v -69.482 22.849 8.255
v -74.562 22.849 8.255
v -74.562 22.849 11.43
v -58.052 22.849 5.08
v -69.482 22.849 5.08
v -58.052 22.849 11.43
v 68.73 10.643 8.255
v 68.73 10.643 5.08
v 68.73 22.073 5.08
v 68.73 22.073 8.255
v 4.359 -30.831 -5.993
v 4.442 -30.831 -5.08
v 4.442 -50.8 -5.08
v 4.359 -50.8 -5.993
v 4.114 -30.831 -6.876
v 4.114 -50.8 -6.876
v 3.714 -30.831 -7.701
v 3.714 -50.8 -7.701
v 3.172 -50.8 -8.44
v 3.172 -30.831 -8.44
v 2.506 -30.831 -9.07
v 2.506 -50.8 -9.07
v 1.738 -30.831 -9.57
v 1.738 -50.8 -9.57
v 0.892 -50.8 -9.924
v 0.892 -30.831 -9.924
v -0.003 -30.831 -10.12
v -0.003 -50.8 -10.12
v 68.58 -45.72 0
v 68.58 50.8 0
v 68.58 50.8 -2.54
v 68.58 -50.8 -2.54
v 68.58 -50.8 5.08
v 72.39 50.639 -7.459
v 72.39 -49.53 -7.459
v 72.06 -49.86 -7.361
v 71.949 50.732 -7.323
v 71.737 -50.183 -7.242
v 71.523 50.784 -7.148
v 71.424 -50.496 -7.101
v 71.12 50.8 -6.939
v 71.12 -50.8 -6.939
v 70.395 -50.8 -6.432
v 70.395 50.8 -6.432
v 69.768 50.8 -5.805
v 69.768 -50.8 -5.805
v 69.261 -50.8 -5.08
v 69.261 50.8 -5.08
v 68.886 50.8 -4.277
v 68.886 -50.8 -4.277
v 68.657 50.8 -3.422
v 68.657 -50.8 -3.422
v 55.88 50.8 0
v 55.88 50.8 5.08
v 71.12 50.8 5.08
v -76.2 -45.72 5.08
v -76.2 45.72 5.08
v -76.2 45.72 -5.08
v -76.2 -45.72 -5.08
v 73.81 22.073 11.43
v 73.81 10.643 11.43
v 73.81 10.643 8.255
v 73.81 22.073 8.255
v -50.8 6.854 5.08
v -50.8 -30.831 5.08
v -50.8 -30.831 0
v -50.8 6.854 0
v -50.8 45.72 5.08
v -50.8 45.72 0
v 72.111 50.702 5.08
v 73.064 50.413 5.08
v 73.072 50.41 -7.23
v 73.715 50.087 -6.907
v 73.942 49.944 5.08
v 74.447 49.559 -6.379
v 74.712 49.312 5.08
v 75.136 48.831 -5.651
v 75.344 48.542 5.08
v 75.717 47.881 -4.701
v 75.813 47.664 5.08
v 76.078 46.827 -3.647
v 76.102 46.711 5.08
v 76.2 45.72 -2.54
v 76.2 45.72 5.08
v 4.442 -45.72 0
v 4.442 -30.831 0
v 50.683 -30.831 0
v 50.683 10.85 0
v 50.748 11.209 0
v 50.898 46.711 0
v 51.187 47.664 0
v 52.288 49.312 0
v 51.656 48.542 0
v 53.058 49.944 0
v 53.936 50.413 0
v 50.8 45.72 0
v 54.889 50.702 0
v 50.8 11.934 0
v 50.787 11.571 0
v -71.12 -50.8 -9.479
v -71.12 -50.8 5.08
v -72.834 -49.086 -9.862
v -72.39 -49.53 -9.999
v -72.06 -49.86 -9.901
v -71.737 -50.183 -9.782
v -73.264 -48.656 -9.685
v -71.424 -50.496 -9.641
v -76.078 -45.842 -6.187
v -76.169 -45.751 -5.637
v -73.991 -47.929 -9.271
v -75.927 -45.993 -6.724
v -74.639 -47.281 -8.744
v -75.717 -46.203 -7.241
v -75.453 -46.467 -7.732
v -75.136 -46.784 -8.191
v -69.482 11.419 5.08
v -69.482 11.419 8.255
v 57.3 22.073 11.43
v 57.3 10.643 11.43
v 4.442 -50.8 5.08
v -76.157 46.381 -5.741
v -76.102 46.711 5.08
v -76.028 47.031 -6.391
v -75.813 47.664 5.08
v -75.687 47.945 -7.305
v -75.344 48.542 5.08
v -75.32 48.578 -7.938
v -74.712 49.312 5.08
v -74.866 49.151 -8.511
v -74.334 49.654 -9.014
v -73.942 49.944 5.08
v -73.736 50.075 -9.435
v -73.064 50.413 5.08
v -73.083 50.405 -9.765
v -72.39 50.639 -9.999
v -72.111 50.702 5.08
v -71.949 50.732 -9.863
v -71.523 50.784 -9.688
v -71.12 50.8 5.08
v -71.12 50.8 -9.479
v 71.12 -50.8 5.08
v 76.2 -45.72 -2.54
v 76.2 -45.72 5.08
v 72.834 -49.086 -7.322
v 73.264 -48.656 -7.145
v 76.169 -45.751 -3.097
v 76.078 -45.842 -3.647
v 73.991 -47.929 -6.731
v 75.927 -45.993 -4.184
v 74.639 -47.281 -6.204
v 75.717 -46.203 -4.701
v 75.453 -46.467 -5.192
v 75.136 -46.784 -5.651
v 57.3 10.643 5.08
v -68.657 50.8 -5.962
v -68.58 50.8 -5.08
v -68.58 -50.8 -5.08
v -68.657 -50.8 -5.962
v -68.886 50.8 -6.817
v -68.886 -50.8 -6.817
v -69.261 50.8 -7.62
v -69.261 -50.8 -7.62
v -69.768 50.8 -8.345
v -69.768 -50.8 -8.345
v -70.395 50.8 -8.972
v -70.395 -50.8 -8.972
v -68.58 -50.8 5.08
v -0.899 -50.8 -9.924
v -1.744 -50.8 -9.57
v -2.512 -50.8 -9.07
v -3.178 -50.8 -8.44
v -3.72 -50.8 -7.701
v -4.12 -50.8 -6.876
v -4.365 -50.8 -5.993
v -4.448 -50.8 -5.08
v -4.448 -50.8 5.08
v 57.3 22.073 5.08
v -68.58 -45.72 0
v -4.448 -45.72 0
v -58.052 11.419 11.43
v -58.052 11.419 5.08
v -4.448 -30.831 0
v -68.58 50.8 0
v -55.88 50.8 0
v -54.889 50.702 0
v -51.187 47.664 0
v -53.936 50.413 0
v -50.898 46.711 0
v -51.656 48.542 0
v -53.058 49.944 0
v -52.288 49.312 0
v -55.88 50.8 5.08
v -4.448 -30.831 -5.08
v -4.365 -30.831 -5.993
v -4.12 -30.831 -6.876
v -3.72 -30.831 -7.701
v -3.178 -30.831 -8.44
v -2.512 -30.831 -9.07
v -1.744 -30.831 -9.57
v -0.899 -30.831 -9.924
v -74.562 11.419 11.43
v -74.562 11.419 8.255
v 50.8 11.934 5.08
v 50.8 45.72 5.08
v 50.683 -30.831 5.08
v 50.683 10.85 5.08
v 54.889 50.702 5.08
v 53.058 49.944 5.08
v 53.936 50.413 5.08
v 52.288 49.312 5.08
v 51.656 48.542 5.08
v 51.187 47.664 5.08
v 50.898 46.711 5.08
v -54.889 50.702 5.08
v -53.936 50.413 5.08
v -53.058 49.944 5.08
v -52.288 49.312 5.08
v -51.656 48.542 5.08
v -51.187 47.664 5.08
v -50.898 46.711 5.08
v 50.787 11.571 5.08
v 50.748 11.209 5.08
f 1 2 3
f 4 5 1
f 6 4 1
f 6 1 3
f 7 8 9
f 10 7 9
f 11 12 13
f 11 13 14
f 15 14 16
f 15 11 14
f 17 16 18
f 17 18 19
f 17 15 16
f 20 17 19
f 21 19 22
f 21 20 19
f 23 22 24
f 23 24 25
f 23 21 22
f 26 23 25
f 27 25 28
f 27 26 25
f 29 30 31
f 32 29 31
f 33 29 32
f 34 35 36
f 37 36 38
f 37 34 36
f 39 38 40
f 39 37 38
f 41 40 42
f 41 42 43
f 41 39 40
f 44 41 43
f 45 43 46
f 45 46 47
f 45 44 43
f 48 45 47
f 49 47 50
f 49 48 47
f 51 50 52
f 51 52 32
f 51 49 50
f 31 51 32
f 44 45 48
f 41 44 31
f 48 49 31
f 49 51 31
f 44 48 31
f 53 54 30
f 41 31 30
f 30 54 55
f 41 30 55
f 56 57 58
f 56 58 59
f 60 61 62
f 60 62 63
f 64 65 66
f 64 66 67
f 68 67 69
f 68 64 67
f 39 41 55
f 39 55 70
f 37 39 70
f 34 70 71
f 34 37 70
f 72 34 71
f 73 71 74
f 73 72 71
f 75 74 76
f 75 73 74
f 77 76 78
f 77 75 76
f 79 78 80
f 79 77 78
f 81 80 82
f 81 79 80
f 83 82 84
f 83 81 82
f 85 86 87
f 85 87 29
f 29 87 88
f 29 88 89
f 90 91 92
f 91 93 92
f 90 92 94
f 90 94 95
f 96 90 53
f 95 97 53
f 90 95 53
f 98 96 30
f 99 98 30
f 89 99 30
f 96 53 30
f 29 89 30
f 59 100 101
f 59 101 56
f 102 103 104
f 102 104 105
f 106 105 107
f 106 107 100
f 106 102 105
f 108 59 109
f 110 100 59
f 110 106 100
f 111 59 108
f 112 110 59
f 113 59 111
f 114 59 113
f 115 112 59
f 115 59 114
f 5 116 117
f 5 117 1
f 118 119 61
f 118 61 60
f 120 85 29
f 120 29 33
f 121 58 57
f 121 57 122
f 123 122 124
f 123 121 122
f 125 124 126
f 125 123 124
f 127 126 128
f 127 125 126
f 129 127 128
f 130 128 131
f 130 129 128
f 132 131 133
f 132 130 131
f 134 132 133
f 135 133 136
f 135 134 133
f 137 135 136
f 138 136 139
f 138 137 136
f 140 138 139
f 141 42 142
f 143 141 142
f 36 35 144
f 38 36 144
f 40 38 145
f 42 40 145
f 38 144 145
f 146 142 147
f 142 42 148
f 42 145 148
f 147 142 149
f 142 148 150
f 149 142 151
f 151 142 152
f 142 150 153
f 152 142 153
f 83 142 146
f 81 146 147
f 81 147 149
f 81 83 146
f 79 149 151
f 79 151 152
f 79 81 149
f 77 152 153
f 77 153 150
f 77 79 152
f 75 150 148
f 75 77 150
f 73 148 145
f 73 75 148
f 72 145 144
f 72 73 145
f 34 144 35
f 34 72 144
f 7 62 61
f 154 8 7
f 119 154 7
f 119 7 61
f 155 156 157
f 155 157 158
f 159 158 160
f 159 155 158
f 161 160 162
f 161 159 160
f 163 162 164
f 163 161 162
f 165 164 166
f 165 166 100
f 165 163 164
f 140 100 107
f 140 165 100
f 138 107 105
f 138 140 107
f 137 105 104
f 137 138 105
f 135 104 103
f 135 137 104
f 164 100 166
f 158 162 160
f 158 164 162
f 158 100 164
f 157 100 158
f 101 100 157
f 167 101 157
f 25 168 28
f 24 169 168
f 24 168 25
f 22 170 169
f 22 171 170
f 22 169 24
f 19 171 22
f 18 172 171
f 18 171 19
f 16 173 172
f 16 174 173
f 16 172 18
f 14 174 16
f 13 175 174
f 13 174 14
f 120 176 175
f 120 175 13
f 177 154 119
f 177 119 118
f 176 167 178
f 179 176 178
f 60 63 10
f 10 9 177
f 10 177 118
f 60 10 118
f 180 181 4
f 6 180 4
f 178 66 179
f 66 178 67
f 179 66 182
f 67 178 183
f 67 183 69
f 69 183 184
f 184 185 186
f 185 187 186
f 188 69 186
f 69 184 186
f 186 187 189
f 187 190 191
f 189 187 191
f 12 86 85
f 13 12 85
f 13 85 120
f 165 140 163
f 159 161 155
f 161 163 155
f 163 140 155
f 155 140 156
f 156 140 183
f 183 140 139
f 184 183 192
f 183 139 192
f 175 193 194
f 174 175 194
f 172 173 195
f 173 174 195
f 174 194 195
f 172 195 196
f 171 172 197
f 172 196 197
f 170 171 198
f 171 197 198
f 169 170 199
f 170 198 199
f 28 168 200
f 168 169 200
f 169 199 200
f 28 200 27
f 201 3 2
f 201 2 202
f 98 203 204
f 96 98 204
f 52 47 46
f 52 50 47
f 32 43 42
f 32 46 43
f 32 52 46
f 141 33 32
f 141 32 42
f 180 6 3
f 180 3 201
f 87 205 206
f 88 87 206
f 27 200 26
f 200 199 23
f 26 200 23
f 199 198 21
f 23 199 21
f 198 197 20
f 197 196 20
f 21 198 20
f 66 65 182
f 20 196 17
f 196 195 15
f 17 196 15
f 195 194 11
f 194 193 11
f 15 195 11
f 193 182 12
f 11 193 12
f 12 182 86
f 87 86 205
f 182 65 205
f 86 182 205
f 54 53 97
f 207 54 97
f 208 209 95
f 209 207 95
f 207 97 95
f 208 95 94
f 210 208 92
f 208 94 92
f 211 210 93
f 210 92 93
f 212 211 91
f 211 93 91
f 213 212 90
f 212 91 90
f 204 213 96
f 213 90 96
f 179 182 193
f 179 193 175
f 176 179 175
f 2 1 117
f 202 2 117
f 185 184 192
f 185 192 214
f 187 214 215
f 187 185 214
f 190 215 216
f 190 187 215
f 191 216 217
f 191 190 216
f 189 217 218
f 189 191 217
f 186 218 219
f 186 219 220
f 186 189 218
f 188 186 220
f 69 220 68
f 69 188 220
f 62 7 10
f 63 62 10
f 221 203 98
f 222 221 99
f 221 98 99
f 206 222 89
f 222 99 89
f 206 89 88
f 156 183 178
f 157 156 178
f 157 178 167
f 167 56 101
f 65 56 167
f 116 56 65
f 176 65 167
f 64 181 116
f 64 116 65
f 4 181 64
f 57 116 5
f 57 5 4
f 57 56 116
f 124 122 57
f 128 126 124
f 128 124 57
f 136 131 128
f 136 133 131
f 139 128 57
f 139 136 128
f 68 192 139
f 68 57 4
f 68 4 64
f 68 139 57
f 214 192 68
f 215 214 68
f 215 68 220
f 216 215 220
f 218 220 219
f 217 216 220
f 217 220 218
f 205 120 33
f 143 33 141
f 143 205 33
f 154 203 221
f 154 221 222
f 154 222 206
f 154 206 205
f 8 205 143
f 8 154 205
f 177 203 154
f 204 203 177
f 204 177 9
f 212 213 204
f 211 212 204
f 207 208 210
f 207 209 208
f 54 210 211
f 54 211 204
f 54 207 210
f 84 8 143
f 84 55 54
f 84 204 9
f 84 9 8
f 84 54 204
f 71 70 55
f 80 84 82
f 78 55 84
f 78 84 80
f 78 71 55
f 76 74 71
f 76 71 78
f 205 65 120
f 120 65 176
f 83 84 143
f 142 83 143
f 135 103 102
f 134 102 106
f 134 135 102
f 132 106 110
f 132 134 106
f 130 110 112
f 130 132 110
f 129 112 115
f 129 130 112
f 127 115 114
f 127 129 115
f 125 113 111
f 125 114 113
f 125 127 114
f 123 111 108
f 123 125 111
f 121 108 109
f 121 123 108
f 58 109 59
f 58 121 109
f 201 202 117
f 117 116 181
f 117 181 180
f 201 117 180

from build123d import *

# Parameters (mm, degrees)
F0_W          = 152.4
F0_H          = 101.6
F1_DEPTH      = 5.08
F2_W          = 7.62
F2_H          = 101.6
F3_DEPTH      = 10.16
F4_T1_DEPTH   = 127
F5_W          = 7.62
F5_H          = 101.6
F6_DEPTH      = 7.62
F7_T1_DEPTH   = 127
F8_W          = 8.89
F8_H          = 101.6
F9_DEPTH      = 10.16
F10_T1_DEPTH  = 127
F11_W         = 101.6
F11_H         = 43.9456890713
F12_DEPTH     = 25.4
F13_T1_DEPTH  = 5.08
F13_T3_DEPTH  = 30.48
F13_T5_DEPTH  = 35.56
F13_T7_DEPTH  = 33.02
F14_T1_DEPTH  = 36.2882991577
F14_T3_DEPTH  = 33.7482991577
F14_T5_DEPTH  = 64.1381350342
F14_T7_DEPTH  = 64.1318649658
F14_T12_DEPTH = 90.2664341919
F14_T17_DEPTH = 90.2601641236
F15_W         = 11.43
F15_H         = 11.43
F16_DEPTH     = 6.35
F17_W         = 11.43
F17_H         = 11.43
F18_DEPTH     = 6.35
F19_W         = 11.43
F19_H         = 3.175
F20_DEPTH     = 5.08
F21_W         = 11.43
F21_H         = 3.175
F22_DEPTH     = 5.08
F23_W         = 101.4830252707
F23_H         = 42.7652306713
F24_DEPTH     = 25.4


# Not quite as in the source:
# - a fillet or chamfer that OpenCascade refuses, or shapes differently, is made with other operations: its cross-section is extruded or revolved along the edge and cut away or added


with BuildPart() as f1:
    # F0 (on Top) → F1 (new body)
    with BuildSketch(Plane.XY):
        Rectangle(F0_W, F0_H)
    extrude(amount=F1_DEPTH)

    # F2 (on face) → F3 (join)
    with BuildSketch(Plane(origin=(0, 0, 0), x_dir=(1, 0, 0), z_dir=(0, 0, -1))):
        with Locations((-72.39, 0)):
            Rectangle(F2_W, F2_H)
    extrude(amount=F3_DEPTH)

    # F4: fillet of radius 5.08 on 2 edges, made by hand

    # F4_s2 → F4_t1 (cut)
    with BuildSketch(Plane.XZ.offset(-63.5)):
        with BuildLine():
            ThreePointArc((-71.12, -10.16), (-74.7121024484, -8.6721024484), (-76.2, -5.08))
            Line((-76.2, -5.08), (-76.2, -10.16))
            Line((-76.2, -10.16), (-71.12, -10.16))
        make_face()
        with BuildLine():
            ThreePointArc((-68.58, -5.08), (-70.0678975516, -8.6721024484), (-73.66, -10.16))
            Line((-73.66, -10.16), (-68.58, -10.16))
            Line((-68.58, -10.16), (-68.58, -5.08))
        make_face()
    extrude(amount=F4_T1_DEPTH, mode=Mode.SUBTRACT)

    # F5 (on face) → F6 (join)
    with BuildSketch(Plane(origin=(0, 0, 0), x_dir=(1, 0, 0), z_dir=(0, 0, -1))):
        with Locations((72.39, 0)):
            Rectangle(F5_W, F5_H)
    extrude(amount=F6_DEPTH)

    # F7: fillet of radius 5.08 on 2 edges, made by hand

    # F7_s2 → F7_t1 (cut)
    with BuildSketch(Plane.XZ.offset(-63.5)):
        with BuildLine():
            ThreePointArc((76.2, -2.54), (74.7121024484, -6.1321024484), (71.12, -7.62))
            Line((71.12, -7.62), (76.2, -7.62))
            Line((76.2, -7.62), (76.2, -2.54))
        make_face()
        with BuildLine():
            ThreePointArc((73.66, -7.62), (70.0678975516, -6.1321024484), (68.58, -2.54))
            Line((68.58, -2.54), (68.58, -7.62))
            Line((68.58, -7.62), (73.66, -7.62))
        make_face()
    extrude(amount=F7_T1_DEPTH, mode=Mode.SUBTRACT)

    # F8 (on face) → F9 (join)
    with BuildSketch(Plane(origin=(0, 0, 0), x_dir=(1, 0, 0), z_dir=(0, 0, -1))):
        with Locations((-0.0031350342, 0)):
            Rectangle(F8_W, F8_H)
    extrude(amount=F9_DEPTH)

    # F10: fillet of radius 5.08 on 2 edges, made by hand

    # F10_s2 → F10_t1 (cut)
    with BuildSketch(Plane.XZ.offset(-63.5)):
        with BuildLine():
            ThreePointArc((-4.4481350342, -5.08), (-2.9602374826, -8.6721024484), (0.6318649658, -10.16))
            Line((0.6318649658, -10.16), (-4.4481350342, -10.16))
            Line((-4.4481350342, -10.16), (-4.4481350342, -5.08))
        make_face()
        with BuildLine():
            ThreePointArc((4.4418649658, -5.08), (2.9539674142, -8.6721024484), (-0.6381350342, -10.16))
            Line((-0.6381350342, -10.16), (4.4418649658, -10.16))
            Line((4.4418649658, -10.16), (4.4418649658, -5.08))
        make_face()
    extrude(amount=F10_T1_DEPTH, mode=Mode.SUBTRACT)

    # F11 (on face) → F12 (cut)
    with BuildSketch(Plane.XY.offset(5.08)):
        with Locations((0, 28.8271554643)):
            Rectangle(F11_W, F11_H)
    extrude(amount=-F12_DEPTH, mode=Mode.SUBTRACT)

    # F13: fillet of radius 5.08 on 5 edges, made by hand

    # F13_s2 → F13_t1 (join)
    with BuildSketch(Plane.XY):
        with BuildLine():
            ThreePointArc((50.8, 11.9343109287), (49.3121024484, 8.3422084803), (45.72, 6.8543109287))
            Line((45.72, 6.8543109287), (50.8, 6.8543109287))
            Line((50.8, 6.8543109287), (50.8, 11.9343109287))
        make_face()
    extrude(amount=F13_T1_DEPTH)

    # F13_s4 → F13_t3 (cut)
    with BuildSketch(Plane.XY.offset(-12.7)):
        with BuildLine():
            ThreePointArc((-55.88, 50.8), (-52.2878975516, 49.3121024484), (-50.8, 45.72))
            Line((-50.8, 45.72), (-50.8, 50.8))
            Line((-50.8, 50.8), (-55.88, 50.8))
        make_face()
        with BuildLine():
            ThreePointArc((55.88, 50.8), (52.2878975516, 49.3121024484), (50.8, 45.72))
            Line((50.8, 45.72), (50.8, 50.8))
            Line((50.8, 50.8), (55.88, 50.8))
        make_face()
    extrude(amount=F13_T3_DEPTH, mode=Mode.SUBTRACT)

    # F13_s6 → F13_t5 (cut)
    with BuildSketch(Plane.XY.offset(-17.78)):
        with BuildLine():
            ThreePointArc((-76.2, 45.72), (-74.7121024484, 49.3121024484), (-71.12, 50.8))
            Line((-71.12, 50.8), (-76.2, 50.8))
            Line((-76.2, 50.8), (-76.2, 45.72))
        make_face()
    extrude(amount=F13_T5_DEPTH, mode=Mode.SUBTRACT)

    # F13_s8 → F13_t7 (cut)
    with BuildSketch(Plane.XY.offset(-15.24)):
        with BuildLine():
            ThreePointArc((71.12, 50.8), (74.7121024484, 49.3121024484), (76.2, 45.72))
            Line((76.2, 45.72), (76.2, 50.8))
            Line((76.2, 50.8), (71.12, 50.8))
        make_face()
    extrude(amount=F13_T7_DEPTH, mode=Mode.SUBTRACT)

    # F14: chamfer of 5.08 on 4 edges, made by hand

    # F14_s2 → F14_t1 (cut)
    with BuildSketch(Plane.XY.offset(-18.1441495789)):
        Polygon((-71.12, -50.8), (-76.2, -45.72), (-76.2, -50.8), align=None)
    extrude(amount=F14_T1_DEPTH, mode=Mode.SUBTRACT)

    # F14_s4 → F14_t3 (cut)
    with BuildSketch(Plane.XY.offset(-15.6041495789)):
        Polygon((71.12, -50.8), (76.2, -45.72), (76.2, -50.8), align=None)
    extrude(amount=F14_T3_DEPTH, mode=Mode.SUBTRACT)

    # F14_s6 → F14_t5 (cut)
    with BuildSketch(Plane.YZ.offset(4.4418649658)):
        Polygon((-45.72, 0), (-50.8, 5.08), (-50.8, 0), align=None)
    extrude(amount=F14_T5_DEPTH, mode=Mode.SUBTRACT)

    # F14_s8 → F14_t7 (cut)
    with BuildSketch(Plane.YZ.offset(-68.58)):
        Polygon((-50.8, 5.08), (-45.72, 0), (-50.8, 0), align=None)
    extrude(amount=F14_T7_DEPTH, mode=Mode.SUBTRACT)


with BuildPart() as f14_tool10:
    # F14_s11 → F14_t12 (new body)
    with BuildSketch(Plane.YZ.offset(-8.622284613)):
        Polygon((-45.72, 0), (-50.8, 5.08), (-50.8, 0), align=None)
    extrude(amount=F14_T12_DEPTH)

    split(bisect_by=Plane.YZ.offset(-4.4481350342), keep=Keep.BOTTOM)


with BuildPart() as f1_1:
    add(f1.part)

    # F14_t9: cut F14_tool10
    add(f14_tool10.part, mode=Mode.SUBTRACT)


with BuildPart() as f14_tool15:
    # F14_s16 → F14_t17 (new body)
    with BuildSketch(Plane.YZ.offset(-81.6441495789)):
        Polygon((-50.8, 5.08), (-45.72, 0), (-50.8, 0), align=None)
    extrude(amount=F14_T17_DEPTH)

    split(bisect_by=Plane.YZ.offset(4.4418649658), keep=Keep.TOP)


with BuildPart() as f1_2:
    add(f1_1.part)

    # F14_t14: cut F14_tool15
    add(f14_tool15.part, mode=Mode.SUBTRACT)

    # F15 (on face) → F16 (join)
    with BuildSketch(Plane.XY.offset(5.08)):
        with Locations((63.0153976381, 16.3576488795)):
            Rectangle(F15_W, F15_H)
    extrude(amount=F16_DEPTH)

    # F17 (on face) → F18 (join)
    with BuildSketch(Plane.XY.offset(5.08)):
        with Locations((-63.7673679739, 17.1340169625)):
            Rectangle(F17_W, F17_H)
    extrude(amount=F18_DEPTH)

    # F19 (on face) → F20 (join)
    with BuildSketch(Plane(origin=(-69.4823679739, 0, 0), x_dir=(0, -1, 0), z_dir=(-1, 0, 0))):
        with Locations((-17.1340169625, 9.8425)):
            Rectangle(F19_W, F19_H)
    extrude(amount=F20_DEPTH)

    # F21 (on face) → F22 (join)
    with BuildSketch(Plane.YZ.offset(68.7303976381)):
        with Locations((16.3576488795, 9.8425)):
            Rectangle(F21_W, F21_H)
    extrude(amount=F22_DEPTH)

    # F23 (on face) → F24 (cut)
    with BuildSketch(Plane.XY.offset(5.08)):
        with Locations((-0.0584873646, -9.448304407)):
            Rectangle(F23_W, F23_H)
    extrude(amount=-F24_DEPTH, mode=Mode.SUBTRACT)


solid = f1_2.part
